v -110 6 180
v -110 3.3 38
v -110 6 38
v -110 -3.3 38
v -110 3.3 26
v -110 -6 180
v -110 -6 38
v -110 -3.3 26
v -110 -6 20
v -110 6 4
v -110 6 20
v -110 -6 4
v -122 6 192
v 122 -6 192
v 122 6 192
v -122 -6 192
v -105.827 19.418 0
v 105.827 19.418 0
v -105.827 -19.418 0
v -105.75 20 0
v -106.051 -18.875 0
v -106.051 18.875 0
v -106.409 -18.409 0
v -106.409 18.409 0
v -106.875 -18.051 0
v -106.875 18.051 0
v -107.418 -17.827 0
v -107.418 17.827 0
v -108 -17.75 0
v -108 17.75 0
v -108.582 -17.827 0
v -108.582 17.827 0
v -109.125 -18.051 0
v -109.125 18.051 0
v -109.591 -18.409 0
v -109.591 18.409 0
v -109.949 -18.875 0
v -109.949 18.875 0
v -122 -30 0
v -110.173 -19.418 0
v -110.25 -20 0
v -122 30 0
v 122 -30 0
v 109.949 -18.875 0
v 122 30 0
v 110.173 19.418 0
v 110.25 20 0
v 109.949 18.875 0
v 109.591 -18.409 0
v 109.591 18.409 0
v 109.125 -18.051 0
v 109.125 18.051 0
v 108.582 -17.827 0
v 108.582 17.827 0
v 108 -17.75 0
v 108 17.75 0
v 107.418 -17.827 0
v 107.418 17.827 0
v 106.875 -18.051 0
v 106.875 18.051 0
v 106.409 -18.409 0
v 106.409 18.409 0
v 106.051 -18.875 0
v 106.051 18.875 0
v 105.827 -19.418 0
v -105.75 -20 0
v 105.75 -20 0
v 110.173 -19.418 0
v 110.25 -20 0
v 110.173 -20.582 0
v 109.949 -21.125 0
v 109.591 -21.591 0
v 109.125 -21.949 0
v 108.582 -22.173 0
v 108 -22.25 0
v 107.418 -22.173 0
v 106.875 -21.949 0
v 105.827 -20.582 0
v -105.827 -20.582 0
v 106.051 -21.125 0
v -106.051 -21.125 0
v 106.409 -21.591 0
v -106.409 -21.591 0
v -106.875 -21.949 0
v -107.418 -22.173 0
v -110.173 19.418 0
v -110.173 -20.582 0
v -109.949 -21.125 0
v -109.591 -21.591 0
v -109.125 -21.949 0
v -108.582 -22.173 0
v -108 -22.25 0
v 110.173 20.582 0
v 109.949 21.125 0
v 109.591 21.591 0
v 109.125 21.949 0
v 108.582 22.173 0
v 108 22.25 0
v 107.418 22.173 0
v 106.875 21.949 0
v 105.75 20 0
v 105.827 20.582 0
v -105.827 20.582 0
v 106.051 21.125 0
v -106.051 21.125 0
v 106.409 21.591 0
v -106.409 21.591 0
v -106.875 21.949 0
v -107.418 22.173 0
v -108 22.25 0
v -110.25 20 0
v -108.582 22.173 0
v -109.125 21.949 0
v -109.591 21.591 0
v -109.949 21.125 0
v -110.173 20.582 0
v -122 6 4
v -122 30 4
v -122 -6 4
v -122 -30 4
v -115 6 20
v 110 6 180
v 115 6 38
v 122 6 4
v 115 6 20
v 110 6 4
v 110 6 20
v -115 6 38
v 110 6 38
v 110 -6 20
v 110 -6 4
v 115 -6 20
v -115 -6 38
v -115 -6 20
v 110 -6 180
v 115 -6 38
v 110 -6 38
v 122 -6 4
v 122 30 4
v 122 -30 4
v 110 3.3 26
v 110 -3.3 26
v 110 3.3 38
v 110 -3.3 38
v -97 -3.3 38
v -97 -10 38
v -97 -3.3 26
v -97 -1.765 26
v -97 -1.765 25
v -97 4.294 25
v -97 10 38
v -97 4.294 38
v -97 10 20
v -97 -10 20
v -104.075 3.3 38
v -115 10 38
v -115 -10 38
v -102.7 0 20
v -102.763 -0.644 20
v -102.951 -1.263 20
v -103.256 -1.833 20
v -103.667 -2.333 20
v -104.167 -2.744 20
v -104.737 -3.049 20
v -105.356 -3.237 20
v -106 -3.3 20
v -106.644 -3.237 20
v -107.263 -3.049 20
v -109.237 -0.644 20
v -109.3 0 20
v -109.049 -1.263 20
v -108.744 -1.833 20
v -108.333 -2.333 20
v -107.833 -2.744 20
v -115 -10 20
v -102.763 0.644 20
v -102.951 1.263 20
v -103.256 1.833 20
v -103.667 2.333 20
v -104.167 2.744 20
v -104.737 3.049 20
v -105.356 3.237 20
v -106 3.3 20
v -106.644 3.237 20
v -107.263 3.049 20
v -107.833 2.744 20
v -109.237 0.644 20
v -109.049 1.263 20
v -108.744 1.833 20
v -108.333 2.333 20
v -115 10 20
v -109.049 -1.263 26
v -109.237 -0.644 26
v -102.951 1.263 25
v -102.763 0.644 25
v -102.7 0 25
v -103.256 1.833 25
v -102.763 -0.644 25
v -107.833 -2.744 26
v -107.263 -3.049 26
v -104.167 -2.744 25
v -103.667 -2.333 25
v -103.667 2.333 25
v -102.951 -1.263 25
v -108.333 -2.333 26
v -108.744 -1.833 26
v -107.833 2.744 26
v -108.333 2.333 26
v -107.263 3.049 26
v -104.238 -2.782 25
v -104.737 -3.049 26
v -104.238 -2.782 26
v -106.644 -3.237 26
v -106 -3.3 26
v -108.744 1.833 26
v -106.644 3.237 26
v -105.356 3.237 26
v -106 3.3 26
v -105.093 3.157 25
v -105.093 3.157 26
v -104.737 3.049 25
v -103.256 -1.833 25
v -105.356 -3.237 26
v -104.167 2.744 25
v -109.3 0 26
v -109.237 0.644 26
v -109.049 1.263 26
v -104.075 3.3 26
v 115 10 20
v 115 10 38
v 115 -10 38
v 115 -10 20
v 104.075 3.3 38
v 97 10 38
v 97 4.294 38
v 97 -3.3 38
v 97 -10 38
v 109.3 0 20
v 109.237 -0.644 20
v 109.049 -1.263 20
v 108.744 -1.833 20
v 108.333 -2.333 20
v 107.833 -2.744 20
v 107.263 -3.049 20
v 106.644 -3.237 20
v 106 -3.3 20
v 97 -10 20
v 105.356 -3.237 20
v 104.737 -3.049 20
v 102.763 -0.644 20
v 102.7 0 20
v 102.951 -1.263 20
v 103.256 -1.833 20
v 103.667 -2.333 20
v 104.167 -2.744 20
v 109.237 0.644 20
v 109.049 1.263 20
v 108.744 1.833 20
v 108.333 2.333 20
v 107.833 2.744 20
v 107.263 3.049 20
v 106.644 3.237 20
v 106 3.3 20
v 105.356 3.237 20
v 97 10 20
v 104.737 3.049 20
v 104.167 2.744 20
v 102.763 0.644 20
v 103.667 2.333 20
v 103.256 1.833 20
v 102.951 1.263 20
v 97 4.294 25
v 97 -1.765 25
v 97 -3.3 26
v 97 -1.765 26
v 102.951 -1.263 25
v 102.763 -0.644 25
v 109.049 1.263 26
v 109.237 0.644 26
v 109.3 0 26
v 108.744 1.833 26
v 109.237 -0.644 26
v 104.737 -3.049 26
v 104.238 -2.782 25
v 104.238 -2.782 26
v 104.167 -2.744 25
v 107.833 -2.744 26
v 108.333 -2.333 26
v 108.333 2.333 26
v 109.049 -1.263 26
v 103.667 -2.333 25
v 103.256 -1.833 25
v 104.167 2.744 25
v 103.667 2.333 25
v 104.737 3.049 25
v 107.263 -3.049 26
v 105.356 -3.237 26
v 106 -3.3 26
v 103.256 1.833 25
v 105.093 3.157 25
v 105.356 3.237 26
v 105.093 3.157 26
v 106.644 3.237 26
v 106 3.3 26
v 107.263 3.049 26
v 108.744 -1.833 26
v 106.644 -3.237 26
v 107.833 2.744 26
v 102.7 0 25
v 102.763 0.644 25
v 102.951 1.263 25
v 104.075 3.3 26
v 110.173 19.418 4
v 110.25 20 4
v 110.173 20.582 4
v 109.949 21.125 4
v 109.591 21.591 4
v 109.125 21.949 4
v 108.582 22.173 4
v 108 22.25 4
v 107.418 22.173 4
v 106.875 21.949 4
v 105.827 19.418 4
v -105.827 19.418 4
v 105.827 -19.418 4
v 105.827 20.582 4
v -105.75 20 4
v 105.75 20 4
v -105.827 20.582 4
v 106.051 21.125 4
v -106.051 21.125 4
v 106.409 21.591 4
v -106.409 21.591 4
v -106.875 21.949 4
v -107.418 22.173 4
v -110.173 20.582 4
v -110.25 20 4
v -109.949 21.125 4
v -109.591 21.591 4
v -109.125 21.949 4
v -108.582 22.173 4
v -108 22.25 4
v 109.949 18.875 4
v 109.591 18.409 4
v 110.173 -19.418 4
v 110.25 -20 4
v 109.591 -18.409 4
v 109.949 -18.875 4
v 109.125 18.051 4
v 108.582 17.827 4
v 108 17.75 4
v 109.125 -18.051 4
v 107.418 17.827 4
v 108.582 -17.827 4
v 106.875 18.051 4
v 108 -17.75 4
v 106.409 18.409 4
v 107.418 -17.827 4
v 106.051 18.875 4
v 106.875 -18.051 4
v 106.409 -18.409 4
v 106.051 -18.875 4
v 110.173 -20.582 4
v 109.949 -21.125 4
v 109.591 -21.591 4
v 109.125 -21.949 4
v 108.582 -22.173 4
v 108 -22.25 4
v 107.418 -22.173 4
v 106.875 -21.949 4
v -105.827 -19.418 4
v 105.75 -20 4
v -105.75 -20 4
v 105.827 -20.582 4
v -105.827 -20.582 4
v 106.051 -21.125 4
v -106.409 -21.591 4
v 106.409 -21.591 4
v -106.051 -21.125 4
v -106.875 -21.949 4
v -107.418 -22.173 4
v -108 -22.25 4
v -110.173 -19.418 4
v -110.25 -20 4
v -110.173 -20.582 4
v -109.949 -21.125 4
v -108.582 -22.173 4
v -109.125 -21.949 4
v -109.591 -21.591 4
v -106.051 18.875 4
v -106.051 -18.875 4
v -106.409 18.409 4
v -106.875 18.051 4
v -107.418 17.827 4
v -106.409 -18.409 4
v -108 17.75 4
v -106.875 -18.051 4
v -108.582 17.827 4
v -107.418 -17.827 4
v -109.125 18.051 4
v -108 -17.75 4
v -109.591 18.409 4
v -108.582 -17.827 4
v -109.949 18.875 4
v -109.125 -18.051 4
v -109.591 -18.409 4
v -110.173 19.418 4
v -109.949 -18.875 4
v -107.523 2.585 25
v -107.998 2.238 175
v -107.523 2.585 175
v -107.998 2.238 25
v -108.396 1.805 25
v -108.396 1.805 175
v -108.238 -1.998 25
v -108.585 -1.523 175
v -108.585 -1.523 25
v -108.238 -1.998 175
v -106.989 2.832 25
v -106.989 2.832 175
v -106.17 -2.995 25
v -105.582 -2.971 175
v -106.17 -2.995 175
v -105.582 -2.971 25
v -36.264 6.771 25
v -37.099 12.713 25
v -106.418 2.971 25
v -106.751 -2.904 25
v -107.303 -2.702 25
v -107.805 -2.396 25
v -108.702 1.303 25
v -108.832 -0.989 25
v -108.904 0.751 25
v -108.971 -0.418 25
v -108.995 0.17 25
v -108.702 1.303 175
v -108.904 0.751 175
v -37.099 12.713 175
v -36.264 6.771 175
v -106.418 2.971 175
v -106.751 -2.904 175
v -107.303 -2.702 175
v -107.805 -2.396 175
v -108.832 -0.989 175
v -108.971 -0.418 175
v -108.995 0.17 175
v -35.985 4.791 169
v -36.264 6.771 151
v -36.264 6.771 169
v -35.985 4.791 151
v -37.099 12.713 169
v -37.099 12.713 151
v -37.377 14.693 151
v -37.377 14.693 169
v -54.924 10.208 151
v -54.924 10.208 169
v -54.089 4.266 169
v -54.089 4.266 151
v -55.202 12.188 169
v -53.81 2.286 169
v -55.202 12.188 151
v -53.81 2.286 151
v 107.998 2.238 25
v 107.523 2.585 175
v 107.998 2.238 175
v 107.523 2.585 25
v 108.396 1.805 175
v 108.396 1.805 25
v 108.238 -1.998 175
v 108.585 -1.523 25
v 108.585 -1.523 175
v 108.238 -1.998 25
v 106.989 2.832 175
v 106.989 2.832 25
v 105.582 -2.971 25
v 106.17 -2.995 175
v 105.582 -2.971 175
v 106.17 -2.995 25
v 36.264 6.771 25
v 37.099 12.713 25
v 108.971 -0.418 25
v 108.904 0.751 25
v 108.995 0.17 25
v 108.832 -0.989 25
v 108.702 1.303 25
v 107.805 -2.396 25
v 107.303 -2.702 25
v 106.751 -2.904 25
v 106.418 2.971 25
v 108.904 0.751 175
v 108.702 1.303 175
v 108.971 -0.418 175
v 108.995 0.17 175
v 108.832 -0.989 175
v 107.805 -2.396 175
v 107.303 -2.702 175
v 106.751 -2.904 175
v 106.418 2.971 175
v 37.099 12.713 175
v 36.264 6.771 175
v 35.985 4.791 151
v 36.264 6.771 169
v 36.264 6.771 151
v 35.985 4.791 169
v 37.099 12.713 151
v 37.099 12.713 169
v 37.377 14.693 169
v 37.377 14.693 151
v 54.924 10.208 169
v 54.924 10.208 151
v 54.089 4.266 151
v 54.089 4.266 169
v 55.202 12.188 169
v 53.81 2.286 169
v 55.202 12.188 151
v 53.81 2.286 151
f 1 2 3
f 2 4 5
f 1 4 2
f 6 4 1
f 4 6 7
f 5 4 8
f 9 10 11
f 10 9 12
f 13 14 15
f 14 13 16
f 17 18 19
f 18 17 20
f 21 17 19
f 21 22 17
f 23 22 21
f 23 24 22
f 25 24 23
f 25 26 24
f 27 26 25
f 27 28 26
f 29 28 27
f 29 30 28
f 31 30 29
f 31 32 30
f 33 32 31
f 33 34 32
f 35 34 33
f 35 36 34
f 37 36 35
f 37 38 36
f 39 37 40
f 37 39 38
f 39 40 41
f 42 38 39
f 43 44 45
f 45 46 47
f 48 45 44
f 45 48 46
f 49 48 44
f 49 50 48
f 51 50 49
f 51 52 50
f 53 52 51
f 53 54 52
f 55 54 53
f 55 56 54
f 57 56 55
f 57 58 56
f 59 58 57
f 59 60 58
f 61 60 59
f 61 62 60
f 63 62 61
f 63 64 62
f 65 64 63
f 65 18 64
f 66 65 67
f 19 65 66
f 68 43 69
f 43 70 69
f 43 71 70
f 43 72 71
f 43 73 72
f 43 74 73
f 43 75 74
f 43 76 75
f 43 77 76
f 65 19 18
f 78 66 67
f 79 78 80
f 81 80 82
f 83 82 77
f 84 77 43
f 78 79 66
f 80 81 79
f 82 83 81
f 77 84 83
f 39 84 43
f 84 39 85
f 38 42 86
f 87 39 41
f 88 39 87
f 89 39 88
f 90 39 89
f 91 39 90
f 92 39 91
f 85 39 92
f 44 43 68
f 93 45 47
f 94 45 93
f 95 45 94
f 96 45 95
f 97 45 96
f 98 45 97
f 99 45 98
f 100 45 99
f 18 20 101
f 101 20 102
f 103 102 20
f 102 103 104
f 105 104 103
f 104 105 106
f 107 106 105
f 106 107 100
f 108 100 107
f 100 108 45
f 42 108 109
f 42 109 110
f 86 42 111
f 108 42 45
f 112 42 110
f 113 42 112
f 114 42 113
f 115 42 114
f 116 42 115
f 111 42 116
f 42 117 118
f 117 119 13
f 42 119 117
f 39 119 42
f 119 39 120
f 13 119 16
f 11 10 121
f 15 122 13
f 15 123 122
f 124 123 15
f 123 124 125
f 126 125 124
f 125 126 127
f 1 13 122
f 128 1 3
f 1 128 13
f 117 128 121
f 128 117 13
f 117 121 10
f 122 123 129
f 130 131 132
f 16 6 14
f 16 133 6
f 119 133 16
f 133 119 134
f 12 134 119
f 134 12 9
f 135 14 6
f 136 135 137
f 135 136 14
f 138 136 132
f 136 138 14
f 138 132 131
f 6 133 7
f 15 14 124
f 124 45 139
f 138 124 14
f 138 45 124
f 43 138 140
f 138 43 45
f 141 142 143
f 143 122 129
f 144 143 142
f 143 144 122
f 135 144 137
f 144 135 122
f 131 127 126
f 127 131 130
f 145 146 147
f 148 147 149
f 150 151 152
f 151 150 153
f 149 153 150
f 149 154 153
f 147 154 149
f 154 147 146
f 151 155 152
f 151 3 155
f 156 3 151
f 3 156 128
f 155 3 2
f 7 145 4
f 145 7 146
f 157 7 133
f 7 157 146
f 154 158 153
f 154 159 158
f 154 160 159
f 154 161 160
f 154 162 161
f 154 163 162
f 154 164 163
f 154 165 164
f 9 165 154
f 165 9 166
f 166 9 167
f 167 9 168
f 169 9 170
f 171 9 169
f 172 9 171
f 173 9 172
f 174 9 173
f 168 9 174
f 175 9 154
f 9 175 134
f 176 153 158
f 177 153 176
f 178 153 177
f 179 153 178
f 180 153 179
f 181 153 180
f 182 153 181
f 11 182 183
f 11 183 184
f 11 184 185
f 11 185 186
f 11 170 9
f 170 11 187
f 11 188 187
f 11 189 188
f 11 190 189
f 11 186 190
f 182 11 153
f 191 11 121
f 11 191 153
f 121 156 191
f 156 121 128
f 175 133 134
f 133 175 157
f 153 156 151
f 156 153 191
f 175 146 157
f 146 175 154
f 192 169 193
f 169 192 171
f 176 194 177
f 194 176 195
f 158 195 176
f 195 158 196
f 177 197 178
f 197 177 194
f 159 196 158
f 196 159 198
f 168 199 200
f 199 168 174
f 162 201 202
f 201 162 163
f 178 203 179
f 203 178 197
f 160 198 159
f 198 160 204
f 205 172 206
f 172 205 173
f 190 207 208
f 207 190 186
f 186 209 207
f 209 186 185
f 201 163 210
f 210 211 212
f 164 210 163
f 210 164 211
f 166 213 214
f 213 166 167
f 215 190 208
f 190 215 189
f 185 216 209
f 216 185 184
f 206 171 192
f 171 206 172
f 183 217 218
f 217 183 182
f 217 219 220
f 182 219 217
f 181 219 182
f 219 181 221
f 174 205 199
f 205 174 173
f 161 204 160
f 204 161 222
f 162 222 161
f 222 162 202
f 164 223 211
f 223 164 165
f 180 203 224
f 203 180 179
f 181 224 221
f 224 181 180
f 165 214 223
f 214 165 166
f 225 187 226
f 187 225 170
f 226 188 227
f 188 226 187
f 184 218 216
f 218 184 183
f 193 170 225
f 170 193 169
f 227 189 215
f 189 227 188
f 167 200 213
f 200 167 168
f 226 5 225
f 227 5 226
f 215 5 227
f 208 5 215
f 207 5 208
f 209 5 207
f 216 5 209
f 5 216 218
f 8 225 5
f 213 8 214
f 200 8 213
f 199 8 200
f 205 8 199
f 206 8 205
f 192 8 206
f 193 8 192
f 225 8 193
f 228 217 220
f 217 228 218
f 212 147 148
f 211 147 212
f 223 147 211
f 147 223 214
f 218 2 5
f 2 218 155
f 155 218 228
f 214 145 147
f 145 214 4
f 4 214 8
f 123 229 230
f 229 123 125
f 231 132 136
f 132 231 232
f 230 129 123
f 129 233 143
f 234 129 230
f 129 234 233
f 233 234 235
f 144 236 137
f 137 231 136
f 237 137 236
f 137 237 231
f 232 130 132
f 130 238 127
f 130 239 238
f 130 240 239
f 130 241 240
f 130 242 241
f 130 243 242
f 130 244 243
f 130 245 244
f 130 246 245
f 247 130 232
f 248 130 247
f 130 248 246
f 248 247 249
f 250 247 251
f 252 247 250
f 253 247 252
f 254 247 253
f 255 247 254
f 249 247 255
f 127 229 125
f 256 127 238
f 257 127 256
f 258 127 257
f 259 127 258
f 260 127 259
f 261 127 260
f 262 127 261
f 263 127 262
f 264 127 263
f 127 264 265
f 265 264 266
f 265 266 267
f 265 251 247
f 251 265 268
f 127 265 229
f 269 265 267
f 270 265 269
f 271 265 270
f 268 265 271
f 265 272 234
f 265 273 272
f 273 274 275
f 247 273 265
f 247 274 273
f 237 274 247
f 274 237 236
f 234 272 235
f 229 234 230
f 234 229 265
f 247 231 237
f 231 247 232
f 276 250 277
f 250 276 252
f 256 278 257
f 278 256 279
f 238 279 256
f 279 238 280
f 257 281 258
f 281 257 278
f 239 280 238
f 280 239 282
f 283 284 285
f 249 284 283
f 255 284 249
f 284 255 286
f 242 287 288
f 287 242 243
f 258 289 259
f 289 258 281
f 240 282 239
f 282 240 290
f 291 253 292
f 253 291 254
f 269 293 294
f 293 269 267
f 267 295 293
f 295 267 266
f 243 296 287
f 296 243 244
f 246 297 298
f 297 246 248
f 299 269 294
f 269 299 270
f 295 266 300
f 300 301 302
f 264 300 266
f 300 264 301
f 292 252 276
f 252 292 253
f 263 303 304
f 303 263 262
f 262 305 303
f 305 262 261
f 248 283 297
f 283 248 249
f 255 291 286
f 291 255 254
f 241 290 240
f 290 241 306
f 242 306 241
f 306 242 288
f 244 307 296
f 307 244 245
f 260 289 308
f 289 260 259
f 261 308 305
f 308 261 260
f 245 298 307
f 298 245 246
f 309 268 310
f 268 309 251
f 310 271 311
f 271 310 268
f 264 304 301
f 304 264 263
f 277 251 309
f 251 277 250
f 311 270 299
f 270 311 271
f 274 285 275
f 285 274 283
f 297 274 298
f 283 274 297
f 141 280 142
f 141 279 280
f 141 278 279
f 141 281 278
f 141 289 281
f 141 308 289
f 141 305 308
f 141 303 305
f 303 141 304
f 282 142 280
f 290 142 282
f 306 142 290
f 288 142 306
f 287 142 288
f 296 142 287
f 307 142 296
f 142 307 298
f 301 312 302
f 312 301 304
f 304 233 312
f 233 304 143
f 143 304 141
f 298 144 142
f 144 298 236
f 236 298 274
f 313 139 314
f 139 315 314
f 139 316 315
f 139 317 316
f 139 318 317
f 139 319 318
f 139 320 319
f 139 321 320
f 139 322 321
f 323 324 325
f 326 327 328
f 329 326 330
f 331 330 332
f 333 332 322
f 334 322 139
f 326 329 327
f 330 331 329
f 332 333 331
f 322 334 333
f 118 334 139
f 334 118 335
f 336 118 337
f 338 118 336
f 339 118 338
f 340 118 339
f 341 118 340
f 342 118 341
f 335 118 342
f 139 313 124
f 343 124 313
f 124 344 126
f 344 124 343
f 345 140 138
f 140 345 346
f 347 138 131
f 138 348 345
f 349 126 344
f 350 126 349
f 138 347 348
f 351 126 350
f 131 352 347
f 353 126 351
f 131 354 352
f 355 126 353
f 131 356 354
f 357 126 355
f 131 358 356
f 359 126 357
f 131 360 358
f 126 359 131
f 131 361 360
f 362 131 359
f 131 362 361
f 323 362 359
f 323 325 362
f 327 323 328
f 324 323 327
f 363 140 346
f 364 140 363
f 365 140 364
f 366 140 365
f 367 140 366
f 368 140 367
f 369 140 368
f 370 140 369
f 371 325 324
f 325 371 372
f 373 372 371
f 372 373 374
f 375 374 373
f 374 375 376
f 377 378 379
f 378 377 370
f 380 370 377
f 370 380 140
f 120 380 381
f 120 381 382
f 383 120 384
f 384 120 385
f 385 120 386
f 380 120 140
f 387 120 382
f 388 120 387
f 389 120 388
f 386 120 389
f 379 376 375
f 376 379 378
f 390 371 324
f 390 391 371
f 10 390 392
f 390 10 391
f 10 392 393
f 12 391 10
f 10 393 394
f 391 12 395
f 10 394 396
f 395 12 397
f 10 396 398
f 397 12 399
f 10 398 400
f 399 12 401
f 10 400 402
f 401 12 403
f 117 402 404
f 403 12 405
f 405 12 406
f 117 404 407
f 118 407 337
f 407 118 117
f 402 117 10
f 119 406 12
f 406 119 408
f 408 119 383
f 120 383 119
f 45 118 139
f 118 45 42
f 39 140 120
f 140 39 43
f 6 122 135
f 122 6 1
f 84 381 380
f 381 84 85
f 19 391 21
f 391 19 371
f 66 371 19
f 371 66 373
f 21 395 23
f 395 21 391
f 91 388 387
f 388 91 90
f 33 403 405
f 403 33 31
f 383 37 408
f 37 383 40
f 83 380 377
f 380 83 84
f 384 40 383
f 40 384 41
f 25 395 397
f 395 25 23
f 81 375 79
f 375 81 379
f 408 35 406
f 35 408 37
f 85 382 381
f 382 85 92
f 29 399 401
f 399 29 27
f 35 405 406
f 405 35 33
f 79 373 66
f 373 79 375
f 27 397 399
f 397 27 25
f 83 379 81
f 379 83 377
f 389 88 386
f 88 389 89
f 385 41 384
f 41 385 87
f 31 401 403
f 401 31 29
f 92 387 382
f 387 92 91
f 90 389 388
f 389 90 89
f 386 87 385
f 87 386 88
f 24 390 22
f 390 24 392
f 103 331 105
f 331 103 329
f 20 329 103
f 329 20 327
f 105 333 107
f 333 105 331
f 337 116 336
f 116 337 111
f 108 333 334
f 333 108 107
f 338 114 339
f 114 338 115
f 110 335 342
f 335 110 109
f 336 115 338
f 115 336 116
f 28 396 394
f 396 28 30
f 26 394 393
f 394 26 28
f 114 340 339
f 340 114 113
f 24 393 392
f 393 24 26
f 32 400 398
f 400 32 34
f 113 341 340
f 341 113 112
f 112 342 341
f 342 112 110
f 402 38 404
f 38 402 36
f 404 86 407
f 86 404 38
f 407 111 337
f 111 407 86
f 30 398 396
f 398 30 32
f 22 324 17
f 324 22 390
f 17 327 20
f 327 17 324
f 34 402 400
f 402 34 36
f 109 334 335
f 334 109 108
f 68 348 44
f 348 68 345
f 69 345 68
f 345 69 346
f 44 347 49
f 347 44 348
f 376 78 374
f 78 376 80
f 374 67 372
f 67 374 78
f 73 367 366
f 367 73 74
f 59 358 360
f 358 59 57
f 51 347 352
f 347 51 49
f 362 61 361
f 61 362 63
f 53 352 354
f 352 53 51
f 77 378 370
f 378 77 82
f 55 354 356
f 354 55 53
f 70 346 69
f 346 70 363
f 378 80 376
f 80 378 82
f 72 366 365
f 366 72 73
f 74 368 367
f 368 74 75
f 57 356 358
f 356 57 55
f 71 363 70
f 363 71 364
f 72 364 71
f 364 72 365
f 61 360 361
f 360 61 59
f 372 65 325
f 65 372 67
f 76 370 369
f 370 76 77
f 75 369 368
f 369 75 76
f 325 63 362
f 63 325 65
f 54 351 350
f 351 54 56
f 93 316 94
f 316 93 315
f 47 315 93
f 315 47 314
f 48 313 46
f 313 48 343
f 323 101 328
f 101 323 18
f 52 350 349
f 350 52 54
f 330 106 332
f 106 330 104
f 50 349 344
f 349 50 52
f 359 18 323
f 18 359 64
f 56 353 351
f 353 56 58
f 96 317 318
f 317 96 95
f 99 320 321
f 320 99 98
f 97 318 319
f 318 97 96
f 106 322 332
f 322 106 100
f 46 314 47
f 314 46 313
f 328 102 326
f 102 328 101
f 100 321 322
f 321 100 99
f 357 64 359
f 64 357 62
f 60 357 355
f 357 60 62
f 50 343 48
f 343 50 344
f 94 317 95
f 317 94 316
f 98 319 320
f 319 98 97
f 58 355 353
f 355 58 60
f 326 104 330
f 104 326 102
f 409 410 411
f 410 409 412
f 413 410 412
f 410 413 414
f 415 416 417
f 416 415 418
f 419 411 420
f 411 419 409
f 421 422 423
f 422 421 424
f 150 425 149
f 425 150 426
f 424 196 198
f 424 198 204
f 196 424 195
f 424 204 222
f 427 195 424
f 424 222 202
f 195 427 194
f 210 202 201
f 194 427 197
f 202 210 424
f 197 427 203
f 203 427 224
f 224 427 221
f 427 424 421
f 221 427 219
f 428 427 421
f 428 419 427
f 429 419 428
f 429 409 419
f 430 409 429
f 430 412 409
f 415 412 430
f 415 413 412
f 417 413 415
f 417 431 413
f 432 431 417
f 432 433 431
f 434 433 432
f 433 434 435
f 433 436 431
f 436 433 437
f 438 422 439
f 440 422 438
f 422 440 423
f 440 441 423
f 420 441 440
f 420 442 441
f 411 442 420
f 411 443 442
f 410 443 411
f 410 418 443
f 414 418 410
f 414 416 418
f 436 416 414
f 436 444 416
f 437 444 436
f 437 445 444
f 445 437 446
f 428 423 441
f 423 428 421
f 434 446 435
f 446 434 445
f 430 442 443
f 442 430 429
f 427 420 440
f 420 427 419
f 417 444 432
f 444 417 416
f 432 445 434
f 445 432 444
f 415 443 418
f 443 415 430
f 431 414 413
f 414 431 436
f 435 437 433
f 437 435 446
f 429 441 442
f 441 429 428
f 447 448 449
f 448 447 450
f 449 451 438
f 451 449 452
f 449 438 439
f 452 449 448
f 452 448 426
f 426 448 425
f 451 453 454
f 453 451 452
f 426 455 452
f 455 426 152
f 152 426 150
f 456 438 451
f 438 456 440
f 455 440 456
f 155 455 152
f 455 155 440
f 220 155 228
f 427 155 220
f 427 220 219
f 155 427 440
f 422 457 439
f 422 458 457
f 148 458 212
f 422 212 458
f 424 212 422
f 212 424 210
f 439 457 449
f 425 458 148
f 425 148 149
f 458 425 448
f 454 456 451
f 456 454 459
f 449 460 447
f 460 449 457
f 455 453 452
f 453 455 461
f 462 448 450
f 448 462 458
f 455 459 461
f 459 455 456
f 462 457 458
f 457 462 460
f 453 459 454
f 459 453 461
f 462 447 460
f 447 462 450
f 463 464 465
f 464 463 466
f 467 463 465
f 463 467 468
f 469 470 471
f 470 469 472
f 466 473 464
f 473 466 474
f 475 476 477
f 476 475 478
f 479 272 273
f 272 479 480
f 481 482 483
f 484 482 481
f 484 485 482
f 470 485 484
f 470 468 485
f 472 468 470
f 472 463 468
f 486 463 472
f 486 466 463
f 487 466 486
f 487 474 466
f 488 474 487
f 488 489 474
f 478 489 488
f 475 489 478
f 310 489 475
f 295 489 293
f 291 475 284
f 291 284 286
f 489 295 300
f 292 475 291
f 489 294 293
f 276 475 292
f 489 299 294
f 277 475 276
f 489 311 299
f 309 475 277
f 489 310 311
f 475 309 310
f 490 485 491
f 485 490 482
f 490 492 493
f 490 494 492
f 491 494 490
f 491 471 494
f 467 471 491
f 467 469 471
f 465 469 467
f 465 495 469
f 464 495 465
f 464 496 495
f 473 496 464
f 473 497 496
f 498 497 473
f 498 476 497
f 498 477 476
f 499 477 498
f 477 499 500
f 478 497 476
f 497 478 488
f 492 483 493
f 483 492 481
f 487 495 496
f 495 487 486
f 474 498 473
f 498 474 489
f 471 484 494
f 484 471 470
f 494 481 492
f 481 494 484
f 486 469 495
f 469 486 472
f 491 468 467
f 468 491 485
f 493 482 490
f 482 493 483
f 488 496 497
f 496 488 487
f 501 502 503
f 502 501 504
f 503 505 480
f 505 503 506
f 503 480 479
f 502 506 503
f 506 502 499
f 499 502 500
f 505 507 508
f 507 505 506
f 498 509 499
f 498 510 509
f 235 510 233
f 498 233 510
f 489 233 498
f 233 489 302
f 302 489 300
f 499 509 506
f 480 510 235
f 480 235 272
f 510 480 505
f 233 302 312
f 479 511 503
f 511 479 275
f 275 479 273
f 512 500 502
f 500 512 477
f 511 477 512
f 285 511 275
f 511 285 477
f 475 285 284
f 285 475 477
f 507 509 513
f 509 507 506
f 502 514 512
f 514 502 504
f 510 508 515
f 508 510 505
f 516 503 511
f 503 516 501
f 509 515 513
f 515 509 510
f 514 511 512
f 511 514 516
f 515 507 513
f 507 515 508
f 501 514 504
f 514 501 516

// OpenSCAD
// file: ../models/drone-playground-saloon-door/model.scad
door_width=70; door_height=150; door_thickness=6; hinge_pin_diameter=6; hinge_offset=5;
module saloon_door(){ union(){ cylinder(d=hinge_pin_diameter,h=door_height,$fn=32); translate([0,-door_thickness/2,0]) cube([door_width,door_thickness,door_height]); translate([door_width-18,-door_thickness/2-2,door_height-24]) cube([18,door_thickness+4,18]); }}
assert(door_width==70 && door_height==150 && hinge_pin_diameter==6); echo("SCADCTL_REQUIREMENT:parameters:PASS"); saloon_door();
// file: ../models/drone-playground-saloon-frame/model.scad
clear_width=220; clear_height=180; frame_bar=12; base_depth=60; mount_hole_diameter=4.5; hinge_bore=6.6;
module hinge_saddle(x,z){ difference(){ translate([x-9,-10,z-6]) cube([18,20,18]); translate([x,0,z]) cylinder(d=hinge_bore,h=22,center=true,$fn=32); translate([x-12,-hinge_bore/2,z]) cube([24,hinge_bore,18]); }}
module saloon_frame(){ difference(){ union(){ translate([-(clear_width+2*frame_bar)/2,-base_depth/2,0]) cube([clear_width+2*frame_bar,base_depth,4]); for(x=[-clear_width/2-frame_bar,clear_width/2]) translate([x,-frame_bar/2,0]) cube([frame_bar,frame_bar,clear_height+frame_bar]); translate([-clear_width/2-frame_bar,-frame_bar/2,clear_height]) cube([clear_width+2*frame_bar,frame_bar,frame_bar]); hinge_saddle(-clear_width/2+4,26); hinge_saddle(clear_width/2-4,26); } for(x=[-108,108],y=[-20,20]) translate([x,y,-1]) cylinder(d=mount_hole_diameter,h=7,$fn=24); }}
assert(clear_width==220 && clear_height==180 && hinge_bore==6.6); echo("SCADCTL_REQUIREMENT:parameters:PASS"); saloon_frame();
// main file
use <../models/drone-playground-saloon-frame/model.scad>
use <../models/drone-playground-saloon-door/model.scad>
color("saddlebrown") saloon_frame();
color("goldenrod") translate([-106,0,25]) rotate([0,0,8]) saloon_door();
color("goldenrod") mirror([1,0,0]) translate([-106,0,25]) rotate([0,0,8]) saloon_door();
